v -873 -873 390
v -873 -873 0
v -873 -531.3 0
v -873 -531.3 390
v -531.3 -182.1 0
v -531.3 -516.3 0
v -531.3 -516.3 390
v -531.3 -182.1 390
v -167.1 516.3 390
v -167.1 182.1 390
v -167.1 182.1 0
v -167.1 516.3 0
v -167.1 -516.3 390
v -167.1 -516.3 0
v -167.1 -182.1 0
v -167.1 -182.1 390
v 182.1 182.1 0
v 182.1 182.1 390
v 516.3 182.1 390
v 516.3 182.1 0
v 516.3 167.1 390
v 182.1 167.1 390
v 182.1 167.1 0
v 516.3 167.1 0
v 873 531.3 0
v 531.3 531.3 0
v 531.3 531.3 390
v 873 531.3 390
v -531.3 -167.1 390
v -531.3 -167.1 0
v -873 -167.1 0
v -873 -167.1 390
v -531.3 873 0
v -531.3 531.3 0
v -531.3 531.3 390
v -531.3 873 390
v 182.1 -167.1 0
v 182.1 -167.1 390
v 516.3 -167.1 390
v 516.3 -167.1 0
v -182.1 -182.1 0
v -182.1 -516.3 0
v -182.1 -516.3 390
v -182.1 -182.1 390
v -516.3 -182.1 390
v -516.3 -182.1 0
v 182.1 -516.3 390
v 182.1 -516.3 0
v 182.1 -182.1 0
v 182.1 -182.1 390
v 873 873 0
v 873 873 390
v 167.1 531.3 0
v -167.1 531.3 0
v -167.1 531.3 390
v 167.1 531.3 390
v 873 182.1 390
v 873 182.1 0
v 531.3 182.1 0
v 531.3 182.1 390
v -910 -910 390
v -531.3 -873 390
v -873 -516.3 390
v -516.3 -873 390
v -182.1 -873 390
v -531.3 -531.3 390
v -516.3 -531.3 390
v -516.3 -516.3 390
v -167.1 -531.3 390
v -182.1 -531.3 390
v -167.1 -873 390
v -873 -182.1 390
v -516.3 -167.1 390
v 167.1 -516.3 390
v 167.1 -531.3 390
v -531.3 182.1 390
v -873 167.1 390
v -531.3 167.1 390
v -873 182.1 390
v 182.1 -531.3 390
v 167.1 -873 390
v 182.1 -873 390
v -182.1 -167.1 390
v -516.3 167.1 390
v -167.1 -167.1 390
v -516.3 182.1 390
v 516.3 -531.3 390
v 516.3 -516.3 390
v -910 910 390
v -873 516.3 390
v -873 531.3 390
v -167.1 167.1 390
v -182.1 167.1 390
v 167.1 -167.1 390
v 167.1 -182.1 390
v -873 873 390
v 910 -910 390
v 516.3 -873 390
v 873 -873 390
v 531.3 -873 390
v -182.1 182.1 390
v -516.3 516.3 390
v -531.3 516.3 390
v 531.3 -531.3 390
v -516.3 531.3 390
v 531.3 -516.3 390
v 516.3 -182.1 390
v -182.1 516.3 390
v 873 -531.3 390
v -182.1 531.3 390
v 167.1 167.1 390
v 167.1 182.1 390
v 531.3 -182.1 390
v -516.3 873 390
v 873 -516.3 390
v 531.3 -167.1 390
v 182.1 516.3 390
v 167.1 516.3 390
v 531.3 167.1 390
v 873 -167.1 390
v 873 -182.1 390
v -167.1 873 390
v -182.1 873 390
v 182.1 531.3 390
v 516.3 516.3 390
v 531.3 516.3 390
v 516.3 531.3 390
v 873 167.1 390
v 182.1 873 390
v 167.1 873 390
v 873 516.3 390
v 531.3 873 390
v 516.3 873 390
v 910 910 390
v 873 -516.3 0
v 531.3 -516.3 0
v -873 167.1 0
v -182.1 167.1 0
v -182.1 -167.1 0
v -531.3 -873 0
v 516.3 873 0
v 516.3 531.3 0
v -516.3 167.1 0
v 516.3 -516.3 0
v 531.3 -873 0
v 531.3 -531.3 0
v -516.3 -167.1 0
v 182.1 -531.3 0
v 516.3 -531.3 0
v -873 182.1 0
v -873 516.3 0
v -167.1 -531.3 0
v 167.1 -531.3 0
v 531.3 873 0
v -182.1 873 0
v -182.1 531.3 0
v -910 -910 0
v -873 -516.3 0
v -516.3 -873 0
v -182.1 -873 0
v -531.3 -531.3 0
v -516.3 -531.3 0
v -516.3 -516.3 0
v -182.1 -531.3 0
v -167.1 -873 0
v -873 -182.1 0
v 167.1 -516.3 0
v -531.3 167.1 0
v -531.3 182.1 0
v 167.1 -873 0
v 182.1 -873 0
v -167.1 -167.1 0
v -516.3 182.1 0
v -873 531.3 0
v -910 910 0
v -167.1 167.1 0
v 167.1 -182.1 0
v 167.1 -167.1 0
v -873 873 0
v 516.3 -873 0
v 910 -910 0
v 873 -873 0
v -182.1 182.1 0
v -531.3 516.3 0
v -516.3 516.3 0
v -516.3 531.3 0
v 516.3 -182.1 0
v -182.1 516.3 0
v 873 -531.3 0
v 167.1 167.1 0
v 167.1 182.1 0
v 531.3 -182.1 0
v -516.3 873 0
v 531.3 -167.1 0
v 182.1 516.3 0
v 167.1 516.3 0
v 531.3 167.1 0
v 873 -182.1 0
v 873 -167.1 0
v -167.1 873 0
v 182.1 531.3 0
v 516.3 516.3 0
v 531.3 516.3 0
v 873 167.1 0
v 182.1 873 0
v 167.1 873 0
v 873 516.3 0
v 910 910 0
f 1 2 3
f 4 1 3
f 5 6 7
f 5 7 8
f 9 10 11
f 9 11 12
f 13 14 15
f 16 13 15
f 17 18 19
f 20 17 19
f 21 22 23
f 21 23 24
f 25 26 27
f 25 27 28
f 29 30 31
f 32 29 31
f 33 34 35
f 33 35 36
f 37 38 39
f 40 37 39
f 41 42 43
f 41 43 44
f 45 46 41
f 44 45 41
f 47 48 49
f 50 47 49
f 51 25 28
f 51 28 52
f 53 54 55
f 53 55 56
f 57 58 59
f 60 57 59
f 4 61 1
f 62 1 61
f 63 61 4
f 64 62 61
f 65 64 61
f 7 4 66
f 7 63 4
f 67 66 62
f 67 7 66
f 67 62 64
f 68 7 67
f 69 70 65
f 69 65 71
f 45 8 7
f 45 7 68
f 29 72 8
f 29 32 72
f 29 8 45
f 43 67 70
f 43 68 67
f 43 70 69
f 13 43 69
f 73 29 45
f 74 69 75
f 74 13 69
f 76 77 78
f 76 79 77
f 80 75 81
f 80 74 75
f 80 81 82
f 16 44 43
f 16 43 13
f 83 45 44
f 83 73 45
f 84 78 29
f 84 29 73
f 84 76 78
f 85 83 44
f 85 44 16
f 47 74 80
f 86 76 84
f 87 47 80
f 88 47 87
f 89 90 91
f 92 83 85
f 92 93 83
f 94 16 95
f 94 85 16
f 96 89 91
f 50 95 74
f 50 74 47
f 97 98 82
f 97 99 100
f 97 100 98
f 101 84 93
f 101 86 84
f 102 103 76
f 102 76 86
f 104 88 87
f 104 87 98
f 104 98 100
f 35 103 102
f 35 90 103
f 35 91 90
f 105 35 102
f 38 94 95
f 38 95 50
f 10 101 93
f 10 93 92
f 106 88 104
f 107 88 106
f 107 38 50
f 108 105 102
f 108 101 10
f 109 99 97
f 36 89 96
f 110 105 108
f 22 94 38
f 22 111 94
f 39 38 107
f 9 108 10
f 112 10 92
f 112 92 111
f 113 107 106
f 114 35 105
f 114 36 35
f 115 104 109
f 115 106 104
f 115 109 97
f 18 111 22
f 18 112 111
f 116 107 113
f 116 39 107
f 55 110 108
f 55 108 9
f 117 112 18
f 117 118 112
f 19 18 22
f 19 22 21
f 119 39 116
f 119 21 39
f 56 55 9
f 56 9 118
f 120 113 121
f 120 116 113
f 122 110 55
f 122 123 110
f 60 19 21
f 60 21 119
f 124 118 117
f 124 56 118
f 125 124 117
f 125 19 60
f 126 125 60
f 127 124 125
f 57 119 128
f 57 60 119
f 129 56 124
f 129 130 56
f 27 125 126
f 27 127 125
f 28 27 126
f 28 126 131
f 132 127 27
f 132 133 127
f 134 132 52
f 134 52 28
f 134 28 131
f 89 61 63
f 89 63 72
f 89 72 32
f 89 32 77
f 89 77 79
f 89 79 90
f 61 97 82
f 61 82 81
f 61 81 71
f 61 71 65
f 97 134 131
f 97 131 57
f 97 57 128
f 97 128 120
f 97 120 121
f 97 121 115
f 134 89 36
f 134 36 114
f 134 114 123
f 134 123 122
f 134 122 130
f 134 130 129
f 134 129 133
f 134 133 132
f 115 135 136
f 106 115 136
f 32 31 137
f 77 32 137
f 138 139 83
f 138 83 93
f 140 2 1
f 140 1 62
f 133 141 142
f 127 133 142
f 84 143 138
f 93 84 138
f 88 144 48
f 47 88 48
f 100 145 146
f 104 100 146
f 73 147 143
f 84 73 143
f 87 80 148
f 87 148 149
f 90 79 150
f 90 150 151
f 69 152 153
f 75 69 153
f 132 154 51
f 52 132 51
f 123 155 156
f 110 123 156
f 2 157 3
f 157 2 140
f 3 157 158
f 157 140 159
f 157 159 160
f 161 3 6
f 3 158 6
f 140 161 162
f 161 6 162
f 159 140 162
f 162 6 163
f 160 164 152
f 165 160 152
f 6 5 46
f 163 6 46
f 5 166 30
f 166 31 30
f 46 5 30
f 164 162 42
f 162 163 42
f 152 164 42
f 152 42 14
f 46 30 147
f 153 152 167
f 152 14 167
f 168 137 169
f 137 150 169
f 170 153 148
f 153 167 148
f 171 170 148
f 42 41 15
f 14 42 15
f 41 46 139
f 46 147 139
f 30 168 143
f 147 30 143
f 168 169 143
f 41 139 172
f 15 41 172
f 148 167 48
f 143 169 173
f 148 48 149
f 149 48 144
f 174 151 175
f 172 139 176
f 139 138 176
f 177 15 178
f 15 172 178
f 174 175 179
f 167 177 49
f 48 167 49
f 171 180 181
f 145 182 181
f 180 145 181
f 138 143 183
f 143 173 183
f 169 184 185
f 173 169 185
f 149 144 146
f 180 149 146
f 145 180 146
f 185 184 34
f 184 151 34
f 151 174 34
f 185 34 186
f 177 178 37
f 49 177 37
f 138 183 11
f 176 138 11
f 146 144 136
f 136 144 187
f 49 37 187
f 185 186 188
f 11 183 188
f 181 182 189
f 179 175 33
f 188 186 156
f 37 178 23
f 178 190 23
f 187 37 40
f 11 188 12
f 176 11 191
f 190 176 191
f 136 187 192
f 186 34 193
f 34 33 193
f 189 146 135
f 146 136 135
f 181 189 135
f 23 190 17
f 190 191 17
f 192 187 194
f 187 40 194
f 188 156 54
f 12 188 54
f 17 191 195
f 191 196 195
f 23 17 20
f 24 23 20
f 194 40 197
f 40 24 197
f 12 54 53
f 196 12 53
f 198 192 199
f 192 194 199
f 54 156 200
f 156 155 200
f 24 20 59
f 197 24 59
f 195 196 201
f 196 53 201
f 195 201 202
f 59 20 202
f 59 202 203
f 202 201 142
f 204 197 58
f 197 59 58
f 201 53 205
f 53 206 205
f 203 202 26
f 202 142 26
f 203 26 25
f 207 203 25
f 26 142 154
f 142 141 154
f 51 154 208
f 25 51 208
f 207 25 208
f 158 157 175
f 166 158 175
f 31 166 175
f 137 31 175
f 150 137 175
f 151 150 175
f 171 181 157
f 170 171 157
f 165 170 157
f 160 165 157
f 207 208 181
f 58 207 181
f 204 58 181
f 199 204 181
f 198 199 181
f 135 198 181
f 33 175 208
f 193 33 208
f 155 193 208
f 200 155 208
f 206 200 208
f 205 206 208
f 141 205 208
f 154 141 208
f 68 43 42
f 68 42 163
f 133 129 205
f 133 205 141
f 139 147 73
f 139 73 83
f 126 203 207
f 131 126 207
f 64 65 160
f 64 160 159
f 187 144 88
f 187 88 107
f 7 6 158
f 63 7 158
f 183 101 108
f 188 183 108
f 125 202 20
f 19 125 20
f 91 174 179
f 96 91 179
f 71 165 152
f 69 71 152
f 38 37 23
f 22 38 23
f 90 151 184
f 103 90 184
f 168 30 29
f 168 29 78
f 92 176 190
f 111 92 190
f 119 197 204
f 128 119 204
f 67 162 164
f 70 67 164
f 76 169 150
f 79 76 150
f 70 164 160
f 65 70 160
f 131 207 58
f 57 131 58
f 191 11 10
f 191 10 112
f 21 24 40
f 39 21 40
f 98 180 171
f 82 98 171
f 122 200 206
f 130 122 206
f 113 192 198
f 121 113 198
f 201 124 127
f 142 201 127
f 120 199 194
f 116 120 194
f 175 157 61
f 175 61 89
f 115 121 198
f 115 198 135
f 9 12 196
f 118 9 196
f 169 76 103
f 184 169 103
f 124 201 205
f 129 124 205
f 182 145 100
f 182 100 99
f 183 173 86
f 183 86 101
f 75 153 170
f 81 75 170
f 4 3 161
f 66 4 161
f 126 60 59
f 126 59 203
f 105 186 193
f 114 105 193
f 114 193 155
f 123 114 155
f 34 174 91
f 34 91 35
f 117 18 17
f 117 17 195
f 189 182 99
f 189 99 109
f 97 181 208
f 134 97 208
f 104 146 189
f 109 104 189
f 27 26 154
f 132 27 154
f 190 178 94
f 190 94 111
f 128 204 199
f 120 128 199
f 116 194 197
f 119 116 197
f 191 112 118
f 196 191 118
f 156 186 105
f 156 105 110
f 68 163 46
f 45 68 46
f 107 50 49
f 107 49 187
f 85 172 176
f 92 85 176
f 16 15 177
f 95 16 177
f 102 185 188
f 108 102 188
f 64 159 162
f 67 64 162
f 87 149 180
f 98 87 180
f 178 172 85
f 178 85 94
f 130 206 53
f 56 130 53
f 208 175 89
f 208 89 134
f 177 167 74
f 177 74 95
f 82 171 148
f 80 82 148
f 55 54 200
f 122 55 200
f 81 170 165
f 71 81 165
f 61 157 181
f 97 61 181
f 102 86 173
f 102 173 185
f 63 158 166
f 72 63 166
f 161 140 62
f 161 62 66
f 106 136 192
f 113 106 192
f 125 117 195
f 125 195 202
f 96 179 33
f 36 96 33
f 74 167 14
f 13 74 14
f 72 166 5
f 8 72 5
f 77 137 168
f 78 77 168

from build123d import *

# Parameters (mm, degrees)
F0_W     = 1820
F0_H     = 1820
F0_W_2   = 341.7
F0_H_2   = 341.7
F0_W_3   = 334.2
F0_H_3   = 15
F0_W_4   = 15
F0_H_4   = 334.2
F1_DEPTH = 390


with BuildPart() as f1:
    # F0 (on Top) → F1 (new body)
    with BuildSketch(Plane.XY):
        Rectangle(F0_W, F0_H)
        with Locations((-702.15, -702.15)):
            Rectangle(F0_W_2, F0_H_2, mode=Mode.SUBTRACT)
        with Locations((702.15, -702.15)):
            Rectangle(F0_W_2, F0_H_2, mode=Mode.SUBTRACT)
        with Locations((-702.15, 702.15)):
            Rectangle(F0_W_2, F0_H_2, mode=Mode.SUBTRACT)
        Polygon((-531.3, 516.3), (-531.3, 531.3), (-516.3, 531.3), (-516.3, 873), (-182.1, 873), (-182.1, 531.3), (-167.1, 531.3), (-167.1, 873), (167.1, 873), (167.1, 531.3), (182.1, 531.3), (182.1, 873), (516.3, 873), (516.3, 531.3), (531.3, 531.3), (531.3, 516.3), (873, 516.3), (873, 182.1), (531.3, 182.1), (531.3, 167.1), (873, 167.1), (873, -167.1), (531.3, -167.1), (531.3, -182.1), (873, -182.1), (873, -516.3), (531.3, -516.3), (531.3, -531.3), (516.3, -531.3), (516.3, -873), (182.1, -873), (182.1, -531.3), (167.1, -531.3), (167.1, -873), (-167.1, -873), (-167.1, -531.3), (-182.1, -531.3), (-182.1, -873), (-516.3, -873), (-516.3, -531.3), (-531.3, -531.3), (-531.3, -516.3), (-873, -516.3), (-873, -182.1), (-531.3, -182.1), (-531.3, -167.1), (-873, -167.1), (-873, 167.1), (-531.3, 167.1), (-531.3, 182.1), (-873, 182.1), (-873, 516.3), align=None, mode=Mode.SUBTRACT)
        with Locations((702.15, 702.15)):
            Rectangle(F0_W_2, F0_H_2, mode=Mode.SUBTRACT)
        with Locations((-349.2, -523.8)):
            Rectangle(F0_W_3, F0_H_3)
        with Locations((-174.6, -523.8)):
            Rectangle(F0_W_4, F0_H_3)
        with Locations((0, -523.8)):
            Rectangle(F0_W_3, F0_H_3)
        with Locations((-174.6, -349.2)):
            Rectangle(F0_W_4, F0_H_4)
        with Locations((349.2, -523.8)):
            Rectangle(F0_W_3, F0_H_3)
        with Locations((174.6, -523.8)):
            Rectangle(F0_W_4, F0_H_3)
        with Locations((174.6, -349.2)):
            Rectangle(F0_W_4, F0_H_4)
        with Locations((523.8, -523.8)):
            Rectangle(F0_W_4, F0_H_3)
        with Locations((523.8, -349.2)):
            Rectangle(F0_W_4, F0_H_4)
        with Locations((523.8, 0)):
            Rectangle(F0_W_4, F0_H_4)
        with Locations((349.2, -174.6)):
            Rectangle(F0_W_3, F0_H_3)
        with Locations((523.8, -174.6)):
            Rectangle(F0_W_4, F0_H_3)
        with Locations((523.8, 349.2)):
            Rectangle(F0_W_4, F0_H_4)
        with Locations((523.8, 174.6)):
            Rectangle(F0_W_4, F0_H_3)
        with Locations((349.2, 174.6)):
            Rectangle(F0_W_3, F0_H_3)
        with Locations((349.2, 523.8)):
            Rectangle(F0_W_3, F0_H_3)
        with Locations((523.8, 523.8)):
            Rectangle(F0_W_4, F0_H_3)
        with Locations((-349.2, 523.8)):
            Rectangle(F0_W_3, F0_H_3)
        with Locations((-523.8, 523.8)):
            Rectangle(F0_W_4, F0_H_3)
        with Locations((-523.8, 349.2)):
            Rectangle(F0_W_4, F0_H_4)
        with Locations((-174.6, 349.2)):
            Rectangle(F0_W_4, F0_H_4)
        with Locations((-174.6, 523.8)):
            Rectangle(F0_W_4, F0_H_3)
        with Locations((0, 523.8)):
            Rectangle(F0_W_3, F0_H_3)
        with Locations((-523.8, 174.6)):
            Rectangle(F0_W_4, F0_H_3)
        with Locations((-349.2, 174.6)):
            Rectangle(F0_W_3, F0_H_3)
        with Locations((-523.8, 0)):
            Rectangle(F0_W_4, F0_H_4)
        with Locations((-174.6, 0)):
            Rectangle(F0_W_4, F0_H_4)
        with Locations((0, 174.6)):
            Rectangle(F0_W_3, F0_H_3)
        with Locations((-174.6, 174.6)):
            Rectangle(F0_W_4, F0_H_3)
        with Locations((-349.2, -174.6)):
            Rectangle(F0_W_3, F0_H_3)
        with Locations((-523.8, -349.2)):
            Rectangle(F0_W_4, F0_H_4)
        with Locations((-523.8, -174.6)):
            Rectangle(F0_W_4, F0_H_3)
        with Locations((0, -174.6)):
            Rectangle(F0_W_3, F0_H_3)
        with Locations((-174.6, -174.6)):
            Rectangle(F0_W_4, F0_H_3)
        with Locations((-523.8, -523.8)):
            Rectangle(F0_W_4, F0_H_3)
        with Locations((174.6, 0)):
            Rectangle(F0_W_4, F0_H_4)
        with Locations((174.6, -174.6)):
            Rectangle(F0_W_4, F0_H_3)
        with Locations((174.6, 349.2)):
            Rectangle(F0_W_4, F0_H_4)
        with Locations((174.6, 174.6)):
            Rectangle(F0_W_4, F0_H_3)
        with Locations((174.6, 523.8)):
            Rectangle(F0_W_4, F0_H_3)
    extrude(amount=F1_DEPTH)


solid = f1.part
